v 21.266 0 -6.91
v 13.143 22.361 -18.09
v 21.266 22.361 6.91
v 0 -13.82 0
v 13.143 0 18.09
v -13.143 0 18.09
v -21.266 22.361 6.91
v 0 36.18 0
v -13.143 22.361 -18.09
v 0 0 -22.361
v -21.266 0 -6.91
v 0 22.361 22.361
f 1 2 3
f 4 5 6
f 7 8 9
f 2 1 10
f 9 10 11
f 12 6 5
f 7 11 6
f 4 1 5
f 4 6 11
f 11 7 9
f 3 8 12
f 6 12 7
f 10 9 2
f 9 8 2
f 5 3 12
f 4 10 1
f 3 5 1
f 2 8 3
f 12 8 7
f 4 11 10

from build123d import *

# Parameters (mm, degrees)
CIRPATTERN1_9_2_ANGLE   = -216
CIRPATTERN1_6_4_ANGLE   = -144
CIRPATTERN1_10_6_ANGLE  = -216
CIRPATTERN1_14_8_ANGLE  = -288
CIRPATTERN1_13_11_ANGLE = -288
CIRPATTERN1_15_13_ANGLE = -288
CIRPATTERN1_16_15_ANGLE = -288
CIRPATTERN1_11_17_ANGLE = -216
CIRPATTERN1_8_19_ANGLE  = -144
CIRPATTERN1_12_21_ANGLE = -216
CIRPATTERN1_7_23_ANGLE  = -144
CIRPATTERN1_3_25_ANGLE  = -72
CIRPATTERN1_4_27_ANGLE  = -72
CIRPATTERN1_5_32_ANGLE  = -144
CIRPATTERN1_34_ANGLE    = -72
CIRPATTERN1_2_36_ANGLE  = -72


with BuildPart() as body_1:
    # Sketch2 → Surface-Fill1: a flat surface bounded by the sketch
    with BuildSketch(Plane(origin=(3.918568349, -8.726779962, -5.393446629), x_dir=(-0.9341723589627158, -0.303530999103343, -0.18759247408507992), z_dir=(0.3568220897730899, -0.7946544722917661, -0.4911234731884233)), mode=Mode.PRIVATE) as surface_fill1_1_region:
        Polygon((4.194695241, 19.021130326), (4.194695241, -7.26542528), (-18.570129692, 5.877852523), align=None)
    surface_fill1_1 = surface_fill1_1_region.sketch.faces()[0]
    # CirPattern1 9: a copy of that surface (a pattern of surface bodies)
    cirpattern1_9_2 = surface_fill1_1.rotate(Axis((0, 0, 0), (0, 1, 0)), CIRPATTERN1_9_2_ANGLE)
    # Sketch3 → Surface-Fill2: a flat surface bounded by the sketch
    with BuildSketch(Plane(origin=(10.258945124, -3.333333333, -14.120226592), x_dir=(0.8164965809277261, 0.13264791052512165, 0.5619055660577252), z_dir=(-0.5773502691896257, 0.18759247408507984, 0.7946544722917663)), mode=Mode.PRIVATE) as surface_fill2_3_region:
        Polygon((3.532571656, 25.918778373), (13.481164945, 1.587553636), (-12.564590426, 5.137431484), align=None)
    surface_fill2_3 = surface_fill2_3_region.sketch.faces()[0]
    # CirPattern1 6: a copy of that surface (a pattern of surface bodies)
    cirpattern1_6_4 = surface_fill2_3.rotate(Axis((0, 0, 0), (0, 1, 0)), CIRPATTERN1_6_4_ANGLE)
    # Sketch3 → Surface-Fill2: a flat surface bounded by the sketch
    with BuildSketch(Plane(origin=(10.258945124, -3.333333333, -14.120226592), x_dir=(0.8164965809277261, 0.13264791052512165, 0.5619055660577252), z_dir=(-0.5773502691896257, 0.18759247408507984, 0.7946544722917663)), mode=Mode.PRIVATE) as surface_fill2_5_region:
        Polygon((3.532571656, 25.918778373), (13.481164945, 1.587553636), (-12.564590426, 5.137431484), align=None)
    surface_fill2_5 = surface_fill2_5_region.sketch.faces()[0]
    # CirPattern1 10: a copy of that surface (a pattern of surface bodies)
    cirpattern1_10_6 = surface_fill2_5.rotate(Axis((0, 0, 0), (0, 1, 0)), CIRPATTERN1_10_6_ANGLE)
    # Sketch3 → Surface-Fill2: a flat surface bounded by the sketch
    with BuildSketch(Plane(origin=(10.258945124, -3.333333333, -14.120226592), x_dir=(0.8164965809277261, 0.13264791052512165, 0.5619055660577252), z_dir=(-0.5773502691896257, 0.18759247408507984, 0.7946544722917663)), mode=Mode.PRIVATE) as surface_fill2_7_region:
        Polygon((3.532571656, 25.918778373), (13.481164945, 1.587553636), (-12.564590426, 5.137431484), align=None)
    surface_fill2_7 = surface_fill2_7_region.sketch.faces()[0]
    # CirPattern1 14: a copy of that surface (a pattern of surface bodies)
    cirpattern1_14_8 = surface_fill2_7.rotate(Axis((0, 0, 0), (0, 1, 0)), CIRPATTERN1_14_8_ANGLE)
    # Sketch6 → Surface-Fill4: a flat surface bounded by the sketch
    with BuildSketch(Plane(origin=(16.599321899, 22.847006554, -5.393446629), x_dir=(0.8164965809277256, -0.561905566057726, 0.13264791052512173), z_dir=(0.5773502691896265, 0.7946544722917657, -0.1875924740850797)), mode=Mode.PRIVATE) as surface_fill4_9_region:
        Polygon((5.715821007, -11.862416603), (-4.232772282, 12.468808133), (-20.329934365, -8.312538756), align=None)
    surface_fill4_9 = surface_fill4_9_region.sketch.faces()[0]
    # Sketch2 → Surface-Fill1: a flat surface bounded by the sketch
    with BuildSketch(Plane(origin=(3.918568349, -8.726779962, -5.393446629), x_dir=(-0.9341723589627158, -0.303530999103343, -0.18759247408507992), z_dir=(0.3568220897730899, -0.7946544722917661, -0.4911234731884233)), mode=Mode.PRIVATE) as surface_fill1_10_region:
        Polygon((4.194695241, 19.021130326), (4.194695241, -7.26542528), (-18.570129692, 5.877852523), align=None)
    surface_fill1_10 = surface_fill1_10_region.sketch.faces()[0]
    # CirPattern1 13: a copy of that surface (a pattern of surface bodies)
    cirpattern1_13_11 = surface_fill1_10.rotate(Axis((0, 0, 0), (0, 1, 0)), CIRPATTERN1_13_11_ANGLE)
    # Sketch5 → Surface-Fill3: a flat surface bounded by the sketch
    with BuildSketch(Plane(origin=(20.517890248, 4.120226592, -6.666666667), x_dir=(0.2975901052216016, 0.059759490383281426, 0.9528215638740166), z_dir=(-0.9341723589627157, -0.1875924740850806, 0.3035309991033427)), mode=Mode.PRIVATE) as surface_fill3_12_region:
        Polygon((-11.989131764, 19.33536107), (-0.255203491, -4.186924808), (14.248729497, 17.736098102), align=None)
    surface_fill3_12 = surface_fill3_12_region.sketch.faces()[0]
    # CirPattern1 15: a copy of that surface (a pattern of surface bodies)
    cirpattern1_15_13 = surface_fill3_12.rotate(Axis((0, 0, 0), (0, 1, 0)), CIRPATTERN1_15_13_ANGLE)
    # Sketch6 → Surface-Fill4: a flat surface bounded by the sketch
    with BuildSketch(Plane(origin=(16.599321899, 22.847006554, -5.393446629), x_dir=(0.8164965809277256, -0.561905566057726, 0.13264791052512173), z_dir=(0.5773502691896265, 0.7946544722917657, -0.1875924740850797)), mode=Mode.PRIVATE) as surface_fill4_14_region:
        Polygon((5.715821007, -11.862416603), (-4.232772282, 12.468808133), (-20.329934365, -8.312538756), align=None)
    surface_fill4_14 = surface_fill4_14_region.sketch.faces()[0]
    # CirPattern1 16: a copy of that surface (a pattern of surface bodies)
    cirpattern1_16_15 = surface_fill4_14.rotate(Axis((0, 0, 0), (0, 1, 0)), CIRPATTERN1_16_15_ANGLE)
    # Sketch5 → Surface-Fill3: a flat surface bounded by the sketch
    with BuildSketch(Plane(origin=(20.517890248, 4.120226592, -6.666666667), x_dir=(0.2975901052216016, 0.059759490383281426, 0.9528215638740166), z_dir=(-0.9341723589627157, -0.1875924740850806, 0.3035309991033427)), mode=Mode.PRIVATE) as surface_fill3_16_region:
        Polygon((-11.989131764, 19.33536107), (-0.255203491, -4.186924808), (14.248729497, 17.736098102), align=None)
    surface_fill3_16 = surface_fill3_16_region.sketch.faces()[0]
    # CirPattern1 11: a copy of that surface (a pattern of surface bodies)
    cirpattern1_11_17 = surface_fill3_16.rotate(Axis((0, 0, 0), (0, 1, 0)), CIRPATTERN1_11_17_ANGLE)
    # Sketch6 → Surface-Fill4: a flat surface bounded by the sketch
    with BuildSketch(Plane(origin=(16.599321899, 22.847006554, -5.393446629), x_dir=(0.8164965809277256, -0.561905566057726, 0.13264791052512173), z_dir=(0.5773502691896265, 0.7946544722917657, -0.1875924740850797)), mode=Mode.PRIVATE) as surface_fill4_18_region:
        Polygon((5.715821007, -11.862416603), (-4.232772282, 12.468808133), (-20.329934365, -8.312538756), align=None)
    surface_fill4_18 = surface_fill4_18_region.sketch.faces()[0]
    # CirPattern1 8: a copy of that surface (a pattern of surface bodies)
    cirpattern1_8_19 = surface_fill4_18.rotate(Axis((0, 0, 0), (0, 1, 0)), CIRPATTERN1_8_19_ANGLE)
    # Sketch6 → Surface-Fill4: a flat surface bounded by the sketch
    with BuildSketch(Plane(origin=(16.599321899, 22.847006554, -5.393446629), x_dir=(0.8164965809277256, -0.561905566057726, 0.13264791052512173), z_dir=(0.5773502691896265, 0.7946544722917657, -0.1875924740850797)), mode=Mode.PRIVATE) as surface_fill4_20_region:
        Polygon((5.715821007, -11.862416603), (-4.232772282, 12.468808133), (-20.329934365, -8.312538756), align=None)
    surface_fill4_20 = surface_fill4_20_region.sketch.faces()[0]
    # CirPattern1 12: a copy of that surface (a pattern of surface bodies)
    cirpattern1_12_21 = surface_fill4_20.rotate(Axis((0, 0, 0), (0, 1, 0)), CIRPATTERN1_12_21_ANGLE)
    # Sketch5 → Surface-Fill3: a flat surface bounded by the sketch
    with BuildSketch(Plane(origin=(20.517890248, 4.120226592, -6.666666667), x_dir=(0.2975901052216016, 0.059759490383281426, 0.9528215638740166), z_dir=(-0.9341723589627157, -0.1875924740850806, 0.3035309991033427)), mode=Mode.PRIVATE) as surface_fill3_22_region:
        Polygon((-11.989131764, 19.33536107), (-0.255203491, -4.186924808), (14.248729497, 17.736098102), align=None)
    surface_fill3_22 = surface_fill3_22_region.sketch.faces()[0]
    # CirPattern1 7: a copy of that surface (a pattern of surface bodies)
    cirpattern1_7_23 = surface_fill3_22.rotate(Axis((0, 0, 0), (0, 1, 0)), CIRPATTERN1_7_23_ANGLE)
    # Sketch5 → Surface-Fill3: a flat surface bounded by the sketch
    with BuildSketch(Plane(origin=(20.517890248, 4.120226592, -6.666666667), x_dir=(0.2975901052216016, 0.059759490383281426, 0.9528215638740166), z_dir=(-0.9341723589627157, -0.1875924740850806, 0.3035309991033427)), mode=Mode.PRIVATE) as surface_fill3_24_region:
        Polygon((-11.989131764, 19.33536107), (-0.255203491, -4.186924808), (14.248729497, 17.736098102), align=None)
    surface_fill3_24 = surface_fill3_24_region.sketch.faces()[0]
    # CirPattern1 3: a copy of that surface (a pattern of surface bodies)
    cirpattern1_3_25 = surface_fill3_24.rotate(Axis((0, 0, 0), (0, 1, 0)), CIRPATTERN1_3_25_ANGLE)
    # Sketch6 → Surface-Fill4: a flat surface bounded by the sketch
    with BuildSketch(Plane(origin=(16.599321899, 22.847006554, -5.393446629), x_dir=(0.8164965809277256, -0.561905566057726, 0.13264791052512173), z_dir=(0.5773502691896265, 0.7946544722917657, -0.1875924740850797)), mode=Mode.PRIVATE) as surface_fill4_26_region:
        Polygon((5.715821007, -11.862416603), (-4.232772282, 12.468808133), (-20.329934365, -8.312538756), align=None)
    surface_fill4_26 = surface_fill4_26_region.sketch.faces()[0]
    # CirPattern1 4: a copy of that surface (a pattern of surface bodies)
    cirpattern1_4_27 = surface_fill4_26.rotate(Axis((0, 0, 0), (0, 1, 0)), CIRPATTERN1_4_27_ANGLE)
    # Sketch2 → Surface-Fill1: a flat surface bounded by the sketch
    with BuildSketch(Plane(origin=(3.918568349, -8.726779962, -5.393446629), x_dir=(-0.9341723589627158, -0.303530999103343, -0.18759247408507992), z_dir=(0.3568220897730899, -0.7946544722917661, -0.4911234731884233)), mode=Mode.PRIVATE) as surface_fill1_28_region:
        Polygon((4.194695241, 19.021130326), (4.194695241, -7.26542528), (-18.570129692, 5.877852523), align=None)
    surface_fill1_28 = surface_fill1_28_region.sketch.faces()[0]
    # Sketch3 → Surface-Fill2: a flat surface bounded by the sketch
    with BuildSketch(Plane(origin=(10.258945124, -3.333333333, -14.120226592), x_dir=(0.8164965809277261, 0.13264791052512165, 0.5619055660577252), z_dir=(-0.5773502691896257, 0.18759247408507984, 0.7946544722917663)), mode=Mode.PRIVATE) as surface_fill2_29_region:
        Polygon((3.532571656, 25.918778373), (13.481164945, 1.587553636), (-12.564590426, 5.137431484), align=None)
    surface_fill2_29 = surface_fill2_29_region.sketch.faces()[0]
    # Sketch5 → Surface-Fill3: a flat surface bounded by the sketch
    with BuildSketch(Plane(origin=(20.517890248, 4.120226592, -6.666666667), x_dir=(0.2975901052216016, 0.059759490383281426, 0.9528215638740166), z_dir=(-0.9341723589627157, -0.1875924740850806, 0.3035309991033427)), mode=Mode.PRIVATE) as surface_fill3_30_region:
        Polygon((-11.989131764, 19.33536107), (-0.255203491, -4.186924808), (14.248729497, 17.736098102), align=None)
    surface_fill3_30 = surface_fill3_30_region.sketch.faces()[0]
    # Sketch2 → Surface-Fill1: a flat surface bounded by the sketch
    with BuildSketch(Plane(origin=(3.918568349, -8.726779962, -5.393446629), x_dir=(-0.9341723589627158, -0.303530999103343, -0.18759247408507992), z_dir=(0.3568220897730899, -0.7946544722917661, -0.4911234731884233)), mode=Mode.PRIVATE) as surface_fill1_31_region:
        Polygon((4.194695241, 19.021130326), (4.194695241, -7.26542528), (-18.570129692, 5.877852523), align=None)
    surface_fill1_31 = surface_fill1_31_region.sketch.faces()[0]
    # CirPattern1 5: a copy of that surface (a pattern of surface bodies)
    cirpattern1_5_32 = surface_fill1_31.rotate(Axis((0, 0, 0), (0, 1, 0)), CIRPATTERN1_5_32_ANGLE)
    # Sketch2 → Surface-Fill1: a flat surface bounded by the sketch
    with BuildSketch(Plane(origin=(3.918568349, -8.726779962, -5.393446629), x_dir=(-0.9341723589627158, -0.303530999103343, -0.18759247408507992), z_dir=(0.3568220897730899, -0.7946544722917661, -0.4911234731884233)), mode=Mode.PRIVATE) as surface_fill1_33_region:
        Polygon((4.194695241, 19.021130326), (4.194695241, -7.26542528), (-18.570129692, 5.877852523), align=None)
    surface_fill1_33 = surface_fill1_33_region.sketch.faces()[0]
    # CirPattern1: a copy of that surface (a pattern of surface bodies)
    cirpattern1_34 = surface_fill1_33.rotate(Axis((0, 0, 0), (0, 1, 0)), CIRPATTERN1_34_ANGLE)
    # Sketch3 → Surface-Fill2: a flat surface bounded by the sketch
    with BuildSketch(Plane(origin=(10.258945124, -3.333333333, -14.120226592), x_dir=(0.8164965809277261, 0.13264791052512165, 0.5619055660577252), z_dir=(-0.5773502691896257, 0.18759247408507984, 0.7946544722917663)), mode=Mode.PRIVATE) as surface_fill2_35_region:
        Polygon((3.532571656, 25.918778373), (13.481164945, 1.587553636), (-12.564590426, 5.137431484), align=None)
    surface_fill2_35 = surface_fill2_35_region.sketch.faces()[0]
    # CirPattern1 2: a copy of that surface (a pattern of surface bodies)
    cirpattern1_2_36 = surface_fill2_35.rotate(Axis((0, 0, 0), (0, 1, 0)), CIRPATTERN1_2_36_ANGLE)
    # Surface-Knit1: the surfaces knitted into a closed skin and filled: a solid
    add(Solid(Shell(Face.sew_faces(cirpattern1_9_2.faces() + cirpattern1_6_4.faces() + cirpattern1_10_6.faces() + cirpattern1_14_8.faces() + surface_fill4_9.faces() + cirpattern1_13_11.faces() + cirpattern1_15_13.faces() + cirpattern1_16_15.faces() + cirpattern1_11_17.faces() + cirpattern1_8_19.faces() + cirpattern1_12_21.faces() + cirpattern1_7_23.faces() + cirpattern1_3_25.faces() + cirpattern1_4_27.faces() + surface_fill1_28.faces() + surface_fill2_29.faces() + surface_fill3_30.faces() + cirpattern1_5_32.faces() + cirpattern1_34.faces() + cirpattern1_2_36.faces())[0])))


solid = body_1.part
